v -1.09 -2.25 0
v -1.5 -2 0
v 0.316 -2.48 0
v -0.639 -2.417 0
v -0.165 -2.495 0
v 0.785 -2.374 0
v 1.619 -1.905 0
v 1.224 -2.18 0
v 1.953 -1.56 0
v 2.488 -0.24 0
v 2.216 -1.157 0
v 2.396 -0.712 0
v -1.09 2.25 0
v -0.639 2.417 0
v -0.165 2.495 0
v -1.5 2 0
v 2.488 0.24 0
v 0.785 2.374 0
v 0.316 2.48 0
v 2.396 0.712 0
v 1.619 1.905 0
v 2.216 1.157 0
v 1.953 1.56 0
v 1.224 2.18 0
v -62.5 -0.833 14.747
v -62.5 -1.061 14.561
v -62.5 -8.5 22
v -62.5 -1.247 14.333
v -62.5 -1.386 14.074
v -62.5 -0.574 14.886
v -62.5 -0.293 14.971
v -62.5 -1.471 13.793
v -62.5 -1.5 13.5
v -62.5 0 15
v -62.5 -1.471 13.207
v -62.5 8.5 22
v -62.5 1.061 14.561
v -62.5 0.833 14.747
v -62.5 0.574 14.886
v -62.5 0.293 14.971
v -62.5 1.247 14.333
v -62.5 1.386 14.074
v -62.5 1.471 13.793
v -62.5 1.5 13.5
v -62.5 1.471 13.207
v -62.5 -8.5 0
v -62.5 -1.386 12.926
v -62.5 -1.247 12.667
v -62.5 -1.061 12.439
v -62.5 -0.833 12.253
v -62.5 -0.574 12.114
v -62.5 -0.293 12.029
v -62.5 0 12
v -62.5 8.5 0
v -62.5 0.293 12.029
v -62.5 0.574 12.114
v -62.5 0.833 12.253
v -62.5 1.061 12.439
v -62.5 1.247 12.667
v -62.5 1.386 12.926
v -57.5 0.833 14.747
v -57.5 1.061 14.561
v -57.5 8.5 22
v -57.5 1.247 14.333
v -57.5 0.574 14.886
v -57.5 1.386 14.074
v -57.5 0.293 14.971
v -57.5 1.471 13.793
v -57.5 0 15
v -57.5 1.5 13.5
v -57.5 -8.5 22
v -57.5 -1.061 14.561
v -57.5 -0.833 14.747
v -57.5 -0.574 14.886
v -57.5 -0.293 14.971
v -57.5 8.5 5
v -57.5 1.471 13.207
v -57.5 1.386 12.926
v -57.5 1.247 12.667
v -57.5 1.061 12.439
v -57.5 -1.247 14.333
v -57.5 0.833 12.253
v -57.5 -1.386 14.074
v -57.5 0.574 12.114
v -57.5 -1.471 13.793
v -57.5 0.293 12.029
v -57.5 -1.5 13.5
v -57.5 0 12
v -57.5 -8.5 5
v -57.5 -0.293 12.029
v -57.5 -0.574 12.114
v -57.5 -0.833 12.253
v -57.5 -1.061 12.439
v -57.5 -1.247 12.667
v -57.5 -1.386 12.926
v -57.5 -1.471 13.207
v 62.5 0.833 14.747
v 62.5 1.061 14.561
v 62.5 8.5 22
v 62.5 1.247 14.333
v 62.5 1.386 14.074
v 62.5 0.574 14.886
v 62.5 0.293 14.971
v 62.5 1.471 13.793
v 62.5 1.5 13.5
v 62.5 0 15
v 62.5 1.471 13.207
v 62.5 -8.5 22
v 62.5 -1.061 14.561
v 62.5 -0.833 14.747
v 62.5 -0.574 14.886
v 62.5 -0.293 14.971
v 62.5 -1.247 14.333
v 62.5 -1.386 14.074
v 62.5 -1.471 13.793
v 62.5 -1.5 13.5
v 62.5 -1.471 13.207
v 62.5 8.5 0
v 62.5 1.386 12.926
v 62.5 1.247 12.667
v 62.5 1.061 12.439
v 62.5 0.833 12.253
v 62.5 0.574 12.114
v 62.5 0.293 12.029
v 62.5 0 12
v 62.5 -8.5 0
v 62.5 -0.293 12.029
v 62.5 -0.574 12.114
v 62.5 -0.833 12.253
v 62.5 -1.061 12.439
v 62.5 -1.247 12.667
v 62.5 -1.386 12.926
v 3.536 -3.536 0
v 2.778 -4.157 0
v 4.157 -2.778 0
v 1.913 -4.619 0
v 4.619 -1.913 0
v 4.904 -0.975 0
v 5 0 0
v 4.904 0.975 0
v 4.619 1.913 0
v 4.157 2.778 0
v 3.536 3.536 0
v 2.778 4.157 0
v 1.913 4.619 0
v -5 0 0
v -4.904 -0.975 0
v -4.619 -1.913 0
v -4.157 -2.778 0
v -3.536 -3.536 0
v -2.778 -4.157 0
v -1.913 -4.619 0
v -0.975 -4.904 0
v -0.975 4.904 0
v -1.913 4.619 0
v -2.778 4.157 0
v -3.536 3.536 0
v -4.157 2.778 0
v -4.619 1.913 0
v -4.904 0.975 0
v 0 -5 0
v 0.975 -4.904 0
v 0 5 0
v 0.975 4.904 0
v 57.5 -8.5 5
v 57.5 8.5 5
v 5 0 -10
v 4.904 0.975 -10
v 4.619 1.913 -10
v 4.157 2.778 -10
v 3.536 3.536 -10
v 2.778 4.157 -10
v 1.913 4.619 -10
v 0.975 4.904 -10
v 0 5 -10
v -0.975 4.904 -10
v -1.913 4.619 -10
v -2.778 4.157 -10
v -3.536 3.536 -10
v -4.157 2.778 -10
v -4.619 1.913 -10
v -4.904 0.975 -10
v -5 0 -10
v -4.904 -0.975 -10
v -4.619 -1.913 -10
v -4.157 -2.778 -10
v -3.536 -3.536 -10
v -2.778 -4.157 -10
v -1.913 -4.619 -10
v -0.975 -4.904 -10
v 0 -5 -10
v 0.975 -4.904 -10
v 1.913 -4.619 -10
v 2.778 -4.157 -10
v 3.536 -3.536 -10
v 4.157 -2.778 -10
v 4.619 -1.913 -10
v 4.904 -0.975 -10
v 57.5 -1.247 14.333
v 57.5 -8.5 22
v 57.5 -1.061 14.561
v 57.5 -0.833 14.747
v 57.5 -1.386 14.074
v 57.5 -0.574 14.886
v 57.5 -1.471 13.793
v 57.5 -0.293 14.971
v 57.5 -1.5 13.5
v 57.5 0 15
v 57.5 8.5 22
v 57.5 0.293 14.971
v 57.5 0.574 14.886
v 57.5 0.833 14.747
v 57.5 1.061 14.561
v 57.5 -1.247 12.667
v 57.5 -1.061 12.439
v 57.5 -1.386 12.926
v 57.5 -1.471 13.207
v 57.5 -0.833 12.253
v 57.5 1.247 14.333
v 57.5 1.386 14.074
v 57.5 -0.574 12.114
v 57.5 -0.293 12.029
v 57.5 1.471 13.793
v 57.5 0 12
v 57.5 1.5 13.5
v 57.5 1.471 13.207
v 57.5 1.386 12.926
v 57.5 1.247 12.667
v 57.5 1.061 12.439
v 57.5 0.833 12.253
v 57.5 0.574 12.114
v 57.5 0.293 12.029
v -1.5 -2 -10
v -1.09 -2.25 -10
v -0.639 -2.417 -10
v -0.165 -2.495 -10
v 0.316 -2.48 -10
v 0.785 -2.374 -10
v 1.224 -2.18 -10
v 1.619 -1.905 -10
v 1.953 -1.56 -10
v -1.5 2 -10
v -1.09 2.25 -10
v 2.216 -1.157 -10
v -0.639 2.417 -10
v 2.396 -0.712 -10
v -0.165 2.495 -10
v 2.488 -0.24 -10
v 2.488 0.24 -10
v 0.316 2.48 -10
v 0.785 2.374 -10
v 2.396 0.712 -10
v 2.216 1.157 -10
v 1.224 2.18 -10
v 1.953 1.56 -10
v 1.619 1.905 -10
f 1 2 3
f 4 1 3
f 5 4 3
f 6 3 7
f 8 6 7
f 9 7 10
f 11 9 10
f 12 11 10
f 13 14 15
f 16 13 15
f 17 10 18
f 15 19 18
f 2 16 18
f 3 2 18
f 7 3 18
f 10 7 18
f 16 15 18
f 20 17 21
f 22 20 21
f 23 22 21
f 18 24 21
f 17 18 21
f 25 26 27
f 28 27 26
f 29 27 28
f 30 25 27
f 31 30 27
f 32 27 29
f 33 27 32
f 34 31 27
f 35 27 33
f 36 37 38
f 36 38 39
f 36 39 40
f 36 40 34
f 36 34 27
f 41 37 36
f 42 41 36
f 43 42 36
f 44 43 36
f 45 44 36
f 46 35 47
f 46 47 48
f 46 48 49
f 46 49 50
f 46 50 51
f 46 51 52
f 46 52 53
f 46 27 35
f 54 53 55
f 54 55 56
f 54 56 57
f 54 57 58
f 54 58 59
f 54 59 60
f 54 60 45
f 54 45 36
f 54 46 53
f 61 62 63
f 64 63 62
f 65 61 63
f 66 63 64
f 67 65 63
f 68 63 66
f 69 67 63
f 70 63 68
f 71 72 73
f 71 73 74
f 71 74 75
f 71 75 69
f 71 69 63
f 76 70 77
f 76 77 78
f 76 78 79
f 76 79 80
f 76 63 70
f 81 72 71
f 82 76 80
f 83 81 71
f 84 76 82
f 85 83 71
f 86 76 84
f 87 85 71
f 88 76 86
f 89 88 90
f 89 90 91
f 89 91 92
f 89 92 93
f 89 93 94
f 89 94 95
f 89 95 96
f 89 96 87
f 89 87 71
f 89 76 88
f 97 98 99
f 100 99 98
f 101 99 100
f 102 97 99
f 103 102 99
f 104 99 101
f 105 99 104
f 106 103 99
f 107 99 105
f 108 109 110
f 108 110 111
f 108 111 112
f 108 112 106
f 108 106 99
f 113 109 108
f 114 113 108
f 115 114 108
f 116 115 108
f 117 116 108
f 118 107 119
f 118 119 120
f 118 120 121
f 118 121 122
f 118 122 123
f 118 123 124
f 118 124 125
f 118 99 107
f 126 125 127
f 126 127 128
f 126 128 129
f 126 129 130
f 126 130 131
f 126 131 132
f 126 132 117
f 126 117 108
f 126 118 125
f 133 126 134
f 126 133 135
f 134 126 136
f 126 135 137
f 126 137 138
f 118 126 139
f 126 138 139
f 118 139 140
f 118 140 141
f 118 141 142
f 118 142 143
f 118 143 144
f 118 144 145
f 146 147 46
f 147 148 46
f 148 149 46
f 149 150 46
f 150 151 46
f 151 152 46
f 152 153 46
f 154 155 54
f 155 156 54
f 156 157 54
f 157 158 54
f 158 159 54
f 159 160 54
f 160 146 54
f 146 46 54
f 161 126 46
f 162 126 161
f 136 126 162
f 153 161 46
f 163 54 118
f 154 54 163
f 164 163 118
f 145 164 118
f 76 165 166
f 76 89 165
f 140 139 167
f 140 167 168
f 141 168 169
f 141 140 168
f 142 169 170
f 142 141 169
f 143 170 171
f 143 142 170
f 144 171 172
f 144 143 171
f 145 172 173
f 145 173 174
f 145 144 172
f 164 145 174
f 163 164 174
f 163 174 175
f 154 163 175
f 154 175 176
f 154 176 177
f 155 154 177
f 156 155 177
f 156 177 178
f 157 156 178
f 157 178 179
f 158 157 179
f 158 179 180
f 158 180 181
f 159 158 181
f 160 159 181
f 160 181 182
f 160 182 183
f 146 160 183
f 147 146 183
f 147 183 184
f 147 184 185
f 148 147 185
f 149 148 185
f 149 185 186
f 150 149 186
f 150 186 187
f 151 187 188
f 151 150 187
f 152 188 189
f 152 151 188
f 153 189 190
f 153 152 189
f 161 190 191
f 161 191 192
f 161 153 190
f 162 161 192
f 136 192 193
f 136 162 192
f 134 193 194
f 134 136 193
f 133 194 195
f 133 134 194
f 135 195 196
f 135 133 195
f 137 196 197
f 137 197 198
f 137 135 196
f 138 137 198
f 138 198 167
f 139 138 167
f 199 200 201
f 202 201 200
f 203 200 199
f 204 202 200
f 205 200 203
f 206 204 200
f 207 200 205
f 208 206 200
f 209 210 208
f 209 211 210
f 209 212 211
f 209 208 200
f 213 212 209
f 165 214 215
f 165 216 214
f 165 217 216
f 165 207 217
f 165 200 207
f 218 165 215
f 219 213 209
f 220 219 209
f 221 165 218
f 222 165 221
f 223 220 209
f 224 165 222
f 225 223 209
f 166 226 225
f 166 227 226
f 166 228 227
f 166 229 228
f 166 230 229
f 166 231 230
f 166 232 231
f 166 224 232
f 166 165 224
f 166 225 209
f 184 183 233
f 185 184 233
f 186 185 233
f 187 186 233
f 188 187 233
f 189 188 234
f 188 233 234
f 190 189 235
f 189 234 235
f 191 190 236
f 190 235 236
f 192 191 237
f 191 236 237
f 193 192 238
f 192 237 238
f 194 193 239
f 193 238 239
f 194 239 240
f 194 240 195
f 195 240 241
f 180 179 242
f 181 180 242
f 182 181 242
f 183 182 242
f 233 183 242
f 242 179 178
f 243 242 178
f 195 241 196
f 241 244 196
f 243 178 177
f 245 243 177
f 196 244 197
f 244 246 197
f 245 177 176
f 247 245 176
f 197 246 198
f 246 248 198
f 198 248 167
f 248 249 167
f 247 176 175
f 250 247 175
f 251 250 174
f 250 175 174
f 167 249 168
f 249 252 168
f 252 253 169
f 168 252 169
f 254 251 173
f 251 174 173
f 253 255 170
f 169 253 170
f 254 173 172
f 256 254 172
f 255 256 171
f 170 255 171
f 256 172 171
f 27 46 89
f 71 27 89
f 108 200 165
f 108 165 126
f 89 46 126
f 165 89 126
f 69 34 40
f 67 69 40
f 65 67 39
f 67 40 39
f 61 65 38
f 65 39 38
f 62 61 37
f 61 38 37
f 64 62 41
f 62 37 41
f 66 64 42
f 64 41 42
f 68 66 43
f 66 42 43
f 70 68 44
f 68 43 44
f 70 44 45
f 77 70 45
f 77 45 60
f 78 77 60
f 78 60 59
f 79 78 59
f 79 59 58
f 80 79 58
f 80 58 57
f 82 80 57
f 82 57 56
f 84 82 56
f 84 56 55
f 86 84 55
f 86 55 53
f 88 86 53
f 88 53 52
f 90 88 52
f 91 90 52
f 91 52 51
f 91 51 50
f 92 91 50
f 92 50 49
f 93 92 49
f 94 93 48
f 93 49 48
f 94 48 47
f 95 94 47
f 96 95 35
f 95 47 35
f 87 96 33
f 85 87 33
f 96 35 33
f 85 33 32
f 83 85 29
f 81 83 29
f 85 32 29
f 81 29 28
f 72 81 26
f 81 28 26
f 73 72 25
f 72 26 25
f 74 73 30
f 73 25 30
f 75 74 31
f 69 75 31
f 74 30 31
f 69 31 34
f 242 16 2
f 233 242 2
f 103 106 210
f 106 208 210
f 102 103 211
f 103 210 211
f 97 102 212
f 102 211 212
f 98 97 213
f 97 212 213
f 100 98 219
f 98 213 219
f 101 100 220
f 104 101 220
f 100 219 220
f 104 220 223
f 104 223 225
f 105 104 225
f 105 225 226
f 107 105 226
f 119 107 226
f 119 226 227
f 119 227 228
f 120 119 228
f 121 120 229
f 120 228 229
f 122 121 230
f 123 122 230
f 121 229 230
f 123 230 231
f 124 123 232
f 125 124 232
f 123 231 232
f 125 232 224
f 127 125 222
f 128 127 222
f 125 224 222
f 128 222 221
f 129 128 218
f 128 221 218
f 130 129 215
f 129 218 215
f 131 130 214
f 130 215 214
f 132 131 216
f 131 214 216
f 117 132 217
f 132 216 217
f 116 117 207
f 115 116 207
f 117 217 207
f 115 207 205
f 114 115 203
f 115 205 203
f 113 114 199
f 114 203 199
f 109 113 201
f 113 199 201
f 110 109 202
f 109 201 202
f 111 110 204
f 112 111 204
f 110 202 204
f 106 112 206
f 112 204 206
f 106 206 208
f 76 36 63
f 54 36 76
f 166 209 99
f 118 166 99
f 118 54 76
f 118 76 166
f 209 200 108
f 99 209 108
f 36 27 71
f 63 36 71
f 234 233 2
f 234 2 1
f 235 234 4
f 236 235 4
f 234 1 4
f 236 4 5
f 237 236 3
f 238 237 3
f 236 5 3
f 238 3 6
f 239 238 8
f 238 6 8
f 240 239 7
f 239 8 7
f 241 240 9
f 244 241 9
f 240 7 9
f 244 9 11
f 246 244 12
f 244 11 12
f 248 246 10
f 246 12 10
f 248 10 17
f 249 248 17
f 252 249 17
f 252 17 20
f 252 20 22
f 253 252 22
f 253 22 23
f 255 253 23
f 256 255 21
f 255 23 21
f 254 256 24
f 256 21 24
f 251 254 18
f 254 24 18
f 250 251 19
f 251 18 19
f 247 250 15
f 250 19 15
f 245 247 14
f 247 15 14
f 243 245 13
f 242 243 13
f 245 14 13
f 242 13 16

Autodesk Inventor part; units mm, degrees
ref_plane "YZ Plane" through (0, 0, 0) normal (1, 0, 0) x (0, 1, 0)
ref_plane "XZ Plane" through (0, 0, 0) normal (0, 1, 0) x (-1, 0, 0)
ref_plane "XY Plane" through (0, 0, 0) normal (0, 0, 1) x (1, 0, 0)
sketch "Sketch1" plane through (0, 0, 0) normal (0, 0, 1) x (1, 0, 0)
  circle A0 centre (0, 0) radius 5
  arc A1 (-1.5, -2) -> (-1.5, 2) centre (0, 0) ccw projected
  line L0 (-1.5, 2) -> (-1.5, -2) projected
  dimension "d0" = 10
extrude "Extrusion1" add sketch "Sketch1" against normal blind 10
sketch "Sketch2" plane through (0, 0, 0) normal (0, 0, 1) x (1, 0, 0)
  line L0 (-17.5, 8.5) -> (17.5, 8.5)
  line L1 (17.5, 8.5) -> (17.5, -8.5)
  line L2 (17.5, -8.5) -> (-17.5, -8.5)
  line L3 (-17.5, -8.5) -> (-17.5, 8.5)
  line L4 (-17.5, 8.5) -> (17.5, -8.5) construction
  line L5 (17.5, 8.5) -> (-17.5, -8.5) construction
  point P0 (0, 0)
  dimension "d3" = 35
  dimension "d4" = 17
extrude "Extrusion2" add sketch "Sketch2" along normal blind 5
sketch "Sketch3" plane through (-17.5, -8.5, 0) normal (-1, 0, 0) x (0, 0, 1)
  line L0 (0, 0) -> (5, 0) projected
  line L1 (5, 0) -> (5, 17) projected
  line L2 (0, 0) -> (5, 0)
  line L3 (5, 0) -> (5, 17)
  line L4 (5, 17) -> (0, 17)
  line L5 (0, 17) -> (0, 0)
  point P0 (0, 8.5)
extrude "Extrusion3" add sketch "Sketch3" along normal blind 45
sketch "Sketch4" plane through (17.5, -8.5, 0) normal (1, 0, 0) x (0, 0, -1)
  line L0 (0, 0) -> (0, 17) projected
  line L1 (-5, 0) -> (-5, 17) projected
  line L2 (0, 0) -> (-5, 0)
  line L3 (-5, 0) -> (-5, 17)
  line L4 (-5, 17) -> (0, 17)
  line L5 (0, 17) -> (0, 0)
  point P0 (0, 8.5)
extrude "Extrusion4" add sketch "Sketch4" along normal blind 45
sketch "Sketch5" plane through (0, 0, 5) normal (0, 0, 1) x (1, 0, 0)
  line L0 (62.5, -8.5) -> (-62.5, -8.5) projected
  line L1 (62.5, -8.5) -> (57.5, -8.5)
  line L2 (57.5, -8.5) -> (57.5, 8.5)
  line L3 (57.5, 8.5) -> (62.5, 8.5)
  line L4 (62.5, 8.5) -> (62.5, -8.5)
  point P0 (0, 0)
  dimension "d11" = 5
  dimension "d12" = 17
extrude "Extrusion5" add sketch "Sketch5" along normal blind 17
sketch "Sketch6" plane through (0, 0, 5) normal (0, 0, 1) x (1, 0, 0)
  line L0 (-62.5, -8.5) -> (62.5, -8.5) projected
  line L1 (-62.5, 8.5) -> (-57.5, 8.5)
  line L2 (-57.5, 8.5) -> (-57.5, -8.5)
  line L3 (-57.5, -8.5) -> (-62.5, -8.5)
  line L4 (-62.5, -8.5) -> (-62.5, 8.5)
  point P0 (0, 0)
  dimension "d15" = 5
extrude "Extrusion6" add sketch "Sketch6" along normal blind 17
sketch "Sketch7" plane through (-62.5, -8.5, 0) normal (-1, 0, 0) x (0, 0, 1)
  line L0 (0, 0) -> (22, 0) projected
  line L1 (22, 0) -> (5, 0)
  line L2 (5, 0) -> (5, 17)
  line L3 (5, 17) -> (22, 17)
  line L4 (22, 17) -> (22, 0)
  line L5 (5, 17) -> (22, 0)
  line L6 (5, 0) -> (22, 17)
  circle A0 centre (13.5, 8.5) radius 1.5
  point P0 (0, 8.5)
  dimension "d18" = 17
  dimension "d19" = 17
  dimension "d20" = 3
extrude "Extrusion7" cut sketch "Sketch7" against normal through all contours A0 L5 L6 | L6 L5 A0 | L5 L6 A0 | A0 L6 L5
properties part number "z axis base"
